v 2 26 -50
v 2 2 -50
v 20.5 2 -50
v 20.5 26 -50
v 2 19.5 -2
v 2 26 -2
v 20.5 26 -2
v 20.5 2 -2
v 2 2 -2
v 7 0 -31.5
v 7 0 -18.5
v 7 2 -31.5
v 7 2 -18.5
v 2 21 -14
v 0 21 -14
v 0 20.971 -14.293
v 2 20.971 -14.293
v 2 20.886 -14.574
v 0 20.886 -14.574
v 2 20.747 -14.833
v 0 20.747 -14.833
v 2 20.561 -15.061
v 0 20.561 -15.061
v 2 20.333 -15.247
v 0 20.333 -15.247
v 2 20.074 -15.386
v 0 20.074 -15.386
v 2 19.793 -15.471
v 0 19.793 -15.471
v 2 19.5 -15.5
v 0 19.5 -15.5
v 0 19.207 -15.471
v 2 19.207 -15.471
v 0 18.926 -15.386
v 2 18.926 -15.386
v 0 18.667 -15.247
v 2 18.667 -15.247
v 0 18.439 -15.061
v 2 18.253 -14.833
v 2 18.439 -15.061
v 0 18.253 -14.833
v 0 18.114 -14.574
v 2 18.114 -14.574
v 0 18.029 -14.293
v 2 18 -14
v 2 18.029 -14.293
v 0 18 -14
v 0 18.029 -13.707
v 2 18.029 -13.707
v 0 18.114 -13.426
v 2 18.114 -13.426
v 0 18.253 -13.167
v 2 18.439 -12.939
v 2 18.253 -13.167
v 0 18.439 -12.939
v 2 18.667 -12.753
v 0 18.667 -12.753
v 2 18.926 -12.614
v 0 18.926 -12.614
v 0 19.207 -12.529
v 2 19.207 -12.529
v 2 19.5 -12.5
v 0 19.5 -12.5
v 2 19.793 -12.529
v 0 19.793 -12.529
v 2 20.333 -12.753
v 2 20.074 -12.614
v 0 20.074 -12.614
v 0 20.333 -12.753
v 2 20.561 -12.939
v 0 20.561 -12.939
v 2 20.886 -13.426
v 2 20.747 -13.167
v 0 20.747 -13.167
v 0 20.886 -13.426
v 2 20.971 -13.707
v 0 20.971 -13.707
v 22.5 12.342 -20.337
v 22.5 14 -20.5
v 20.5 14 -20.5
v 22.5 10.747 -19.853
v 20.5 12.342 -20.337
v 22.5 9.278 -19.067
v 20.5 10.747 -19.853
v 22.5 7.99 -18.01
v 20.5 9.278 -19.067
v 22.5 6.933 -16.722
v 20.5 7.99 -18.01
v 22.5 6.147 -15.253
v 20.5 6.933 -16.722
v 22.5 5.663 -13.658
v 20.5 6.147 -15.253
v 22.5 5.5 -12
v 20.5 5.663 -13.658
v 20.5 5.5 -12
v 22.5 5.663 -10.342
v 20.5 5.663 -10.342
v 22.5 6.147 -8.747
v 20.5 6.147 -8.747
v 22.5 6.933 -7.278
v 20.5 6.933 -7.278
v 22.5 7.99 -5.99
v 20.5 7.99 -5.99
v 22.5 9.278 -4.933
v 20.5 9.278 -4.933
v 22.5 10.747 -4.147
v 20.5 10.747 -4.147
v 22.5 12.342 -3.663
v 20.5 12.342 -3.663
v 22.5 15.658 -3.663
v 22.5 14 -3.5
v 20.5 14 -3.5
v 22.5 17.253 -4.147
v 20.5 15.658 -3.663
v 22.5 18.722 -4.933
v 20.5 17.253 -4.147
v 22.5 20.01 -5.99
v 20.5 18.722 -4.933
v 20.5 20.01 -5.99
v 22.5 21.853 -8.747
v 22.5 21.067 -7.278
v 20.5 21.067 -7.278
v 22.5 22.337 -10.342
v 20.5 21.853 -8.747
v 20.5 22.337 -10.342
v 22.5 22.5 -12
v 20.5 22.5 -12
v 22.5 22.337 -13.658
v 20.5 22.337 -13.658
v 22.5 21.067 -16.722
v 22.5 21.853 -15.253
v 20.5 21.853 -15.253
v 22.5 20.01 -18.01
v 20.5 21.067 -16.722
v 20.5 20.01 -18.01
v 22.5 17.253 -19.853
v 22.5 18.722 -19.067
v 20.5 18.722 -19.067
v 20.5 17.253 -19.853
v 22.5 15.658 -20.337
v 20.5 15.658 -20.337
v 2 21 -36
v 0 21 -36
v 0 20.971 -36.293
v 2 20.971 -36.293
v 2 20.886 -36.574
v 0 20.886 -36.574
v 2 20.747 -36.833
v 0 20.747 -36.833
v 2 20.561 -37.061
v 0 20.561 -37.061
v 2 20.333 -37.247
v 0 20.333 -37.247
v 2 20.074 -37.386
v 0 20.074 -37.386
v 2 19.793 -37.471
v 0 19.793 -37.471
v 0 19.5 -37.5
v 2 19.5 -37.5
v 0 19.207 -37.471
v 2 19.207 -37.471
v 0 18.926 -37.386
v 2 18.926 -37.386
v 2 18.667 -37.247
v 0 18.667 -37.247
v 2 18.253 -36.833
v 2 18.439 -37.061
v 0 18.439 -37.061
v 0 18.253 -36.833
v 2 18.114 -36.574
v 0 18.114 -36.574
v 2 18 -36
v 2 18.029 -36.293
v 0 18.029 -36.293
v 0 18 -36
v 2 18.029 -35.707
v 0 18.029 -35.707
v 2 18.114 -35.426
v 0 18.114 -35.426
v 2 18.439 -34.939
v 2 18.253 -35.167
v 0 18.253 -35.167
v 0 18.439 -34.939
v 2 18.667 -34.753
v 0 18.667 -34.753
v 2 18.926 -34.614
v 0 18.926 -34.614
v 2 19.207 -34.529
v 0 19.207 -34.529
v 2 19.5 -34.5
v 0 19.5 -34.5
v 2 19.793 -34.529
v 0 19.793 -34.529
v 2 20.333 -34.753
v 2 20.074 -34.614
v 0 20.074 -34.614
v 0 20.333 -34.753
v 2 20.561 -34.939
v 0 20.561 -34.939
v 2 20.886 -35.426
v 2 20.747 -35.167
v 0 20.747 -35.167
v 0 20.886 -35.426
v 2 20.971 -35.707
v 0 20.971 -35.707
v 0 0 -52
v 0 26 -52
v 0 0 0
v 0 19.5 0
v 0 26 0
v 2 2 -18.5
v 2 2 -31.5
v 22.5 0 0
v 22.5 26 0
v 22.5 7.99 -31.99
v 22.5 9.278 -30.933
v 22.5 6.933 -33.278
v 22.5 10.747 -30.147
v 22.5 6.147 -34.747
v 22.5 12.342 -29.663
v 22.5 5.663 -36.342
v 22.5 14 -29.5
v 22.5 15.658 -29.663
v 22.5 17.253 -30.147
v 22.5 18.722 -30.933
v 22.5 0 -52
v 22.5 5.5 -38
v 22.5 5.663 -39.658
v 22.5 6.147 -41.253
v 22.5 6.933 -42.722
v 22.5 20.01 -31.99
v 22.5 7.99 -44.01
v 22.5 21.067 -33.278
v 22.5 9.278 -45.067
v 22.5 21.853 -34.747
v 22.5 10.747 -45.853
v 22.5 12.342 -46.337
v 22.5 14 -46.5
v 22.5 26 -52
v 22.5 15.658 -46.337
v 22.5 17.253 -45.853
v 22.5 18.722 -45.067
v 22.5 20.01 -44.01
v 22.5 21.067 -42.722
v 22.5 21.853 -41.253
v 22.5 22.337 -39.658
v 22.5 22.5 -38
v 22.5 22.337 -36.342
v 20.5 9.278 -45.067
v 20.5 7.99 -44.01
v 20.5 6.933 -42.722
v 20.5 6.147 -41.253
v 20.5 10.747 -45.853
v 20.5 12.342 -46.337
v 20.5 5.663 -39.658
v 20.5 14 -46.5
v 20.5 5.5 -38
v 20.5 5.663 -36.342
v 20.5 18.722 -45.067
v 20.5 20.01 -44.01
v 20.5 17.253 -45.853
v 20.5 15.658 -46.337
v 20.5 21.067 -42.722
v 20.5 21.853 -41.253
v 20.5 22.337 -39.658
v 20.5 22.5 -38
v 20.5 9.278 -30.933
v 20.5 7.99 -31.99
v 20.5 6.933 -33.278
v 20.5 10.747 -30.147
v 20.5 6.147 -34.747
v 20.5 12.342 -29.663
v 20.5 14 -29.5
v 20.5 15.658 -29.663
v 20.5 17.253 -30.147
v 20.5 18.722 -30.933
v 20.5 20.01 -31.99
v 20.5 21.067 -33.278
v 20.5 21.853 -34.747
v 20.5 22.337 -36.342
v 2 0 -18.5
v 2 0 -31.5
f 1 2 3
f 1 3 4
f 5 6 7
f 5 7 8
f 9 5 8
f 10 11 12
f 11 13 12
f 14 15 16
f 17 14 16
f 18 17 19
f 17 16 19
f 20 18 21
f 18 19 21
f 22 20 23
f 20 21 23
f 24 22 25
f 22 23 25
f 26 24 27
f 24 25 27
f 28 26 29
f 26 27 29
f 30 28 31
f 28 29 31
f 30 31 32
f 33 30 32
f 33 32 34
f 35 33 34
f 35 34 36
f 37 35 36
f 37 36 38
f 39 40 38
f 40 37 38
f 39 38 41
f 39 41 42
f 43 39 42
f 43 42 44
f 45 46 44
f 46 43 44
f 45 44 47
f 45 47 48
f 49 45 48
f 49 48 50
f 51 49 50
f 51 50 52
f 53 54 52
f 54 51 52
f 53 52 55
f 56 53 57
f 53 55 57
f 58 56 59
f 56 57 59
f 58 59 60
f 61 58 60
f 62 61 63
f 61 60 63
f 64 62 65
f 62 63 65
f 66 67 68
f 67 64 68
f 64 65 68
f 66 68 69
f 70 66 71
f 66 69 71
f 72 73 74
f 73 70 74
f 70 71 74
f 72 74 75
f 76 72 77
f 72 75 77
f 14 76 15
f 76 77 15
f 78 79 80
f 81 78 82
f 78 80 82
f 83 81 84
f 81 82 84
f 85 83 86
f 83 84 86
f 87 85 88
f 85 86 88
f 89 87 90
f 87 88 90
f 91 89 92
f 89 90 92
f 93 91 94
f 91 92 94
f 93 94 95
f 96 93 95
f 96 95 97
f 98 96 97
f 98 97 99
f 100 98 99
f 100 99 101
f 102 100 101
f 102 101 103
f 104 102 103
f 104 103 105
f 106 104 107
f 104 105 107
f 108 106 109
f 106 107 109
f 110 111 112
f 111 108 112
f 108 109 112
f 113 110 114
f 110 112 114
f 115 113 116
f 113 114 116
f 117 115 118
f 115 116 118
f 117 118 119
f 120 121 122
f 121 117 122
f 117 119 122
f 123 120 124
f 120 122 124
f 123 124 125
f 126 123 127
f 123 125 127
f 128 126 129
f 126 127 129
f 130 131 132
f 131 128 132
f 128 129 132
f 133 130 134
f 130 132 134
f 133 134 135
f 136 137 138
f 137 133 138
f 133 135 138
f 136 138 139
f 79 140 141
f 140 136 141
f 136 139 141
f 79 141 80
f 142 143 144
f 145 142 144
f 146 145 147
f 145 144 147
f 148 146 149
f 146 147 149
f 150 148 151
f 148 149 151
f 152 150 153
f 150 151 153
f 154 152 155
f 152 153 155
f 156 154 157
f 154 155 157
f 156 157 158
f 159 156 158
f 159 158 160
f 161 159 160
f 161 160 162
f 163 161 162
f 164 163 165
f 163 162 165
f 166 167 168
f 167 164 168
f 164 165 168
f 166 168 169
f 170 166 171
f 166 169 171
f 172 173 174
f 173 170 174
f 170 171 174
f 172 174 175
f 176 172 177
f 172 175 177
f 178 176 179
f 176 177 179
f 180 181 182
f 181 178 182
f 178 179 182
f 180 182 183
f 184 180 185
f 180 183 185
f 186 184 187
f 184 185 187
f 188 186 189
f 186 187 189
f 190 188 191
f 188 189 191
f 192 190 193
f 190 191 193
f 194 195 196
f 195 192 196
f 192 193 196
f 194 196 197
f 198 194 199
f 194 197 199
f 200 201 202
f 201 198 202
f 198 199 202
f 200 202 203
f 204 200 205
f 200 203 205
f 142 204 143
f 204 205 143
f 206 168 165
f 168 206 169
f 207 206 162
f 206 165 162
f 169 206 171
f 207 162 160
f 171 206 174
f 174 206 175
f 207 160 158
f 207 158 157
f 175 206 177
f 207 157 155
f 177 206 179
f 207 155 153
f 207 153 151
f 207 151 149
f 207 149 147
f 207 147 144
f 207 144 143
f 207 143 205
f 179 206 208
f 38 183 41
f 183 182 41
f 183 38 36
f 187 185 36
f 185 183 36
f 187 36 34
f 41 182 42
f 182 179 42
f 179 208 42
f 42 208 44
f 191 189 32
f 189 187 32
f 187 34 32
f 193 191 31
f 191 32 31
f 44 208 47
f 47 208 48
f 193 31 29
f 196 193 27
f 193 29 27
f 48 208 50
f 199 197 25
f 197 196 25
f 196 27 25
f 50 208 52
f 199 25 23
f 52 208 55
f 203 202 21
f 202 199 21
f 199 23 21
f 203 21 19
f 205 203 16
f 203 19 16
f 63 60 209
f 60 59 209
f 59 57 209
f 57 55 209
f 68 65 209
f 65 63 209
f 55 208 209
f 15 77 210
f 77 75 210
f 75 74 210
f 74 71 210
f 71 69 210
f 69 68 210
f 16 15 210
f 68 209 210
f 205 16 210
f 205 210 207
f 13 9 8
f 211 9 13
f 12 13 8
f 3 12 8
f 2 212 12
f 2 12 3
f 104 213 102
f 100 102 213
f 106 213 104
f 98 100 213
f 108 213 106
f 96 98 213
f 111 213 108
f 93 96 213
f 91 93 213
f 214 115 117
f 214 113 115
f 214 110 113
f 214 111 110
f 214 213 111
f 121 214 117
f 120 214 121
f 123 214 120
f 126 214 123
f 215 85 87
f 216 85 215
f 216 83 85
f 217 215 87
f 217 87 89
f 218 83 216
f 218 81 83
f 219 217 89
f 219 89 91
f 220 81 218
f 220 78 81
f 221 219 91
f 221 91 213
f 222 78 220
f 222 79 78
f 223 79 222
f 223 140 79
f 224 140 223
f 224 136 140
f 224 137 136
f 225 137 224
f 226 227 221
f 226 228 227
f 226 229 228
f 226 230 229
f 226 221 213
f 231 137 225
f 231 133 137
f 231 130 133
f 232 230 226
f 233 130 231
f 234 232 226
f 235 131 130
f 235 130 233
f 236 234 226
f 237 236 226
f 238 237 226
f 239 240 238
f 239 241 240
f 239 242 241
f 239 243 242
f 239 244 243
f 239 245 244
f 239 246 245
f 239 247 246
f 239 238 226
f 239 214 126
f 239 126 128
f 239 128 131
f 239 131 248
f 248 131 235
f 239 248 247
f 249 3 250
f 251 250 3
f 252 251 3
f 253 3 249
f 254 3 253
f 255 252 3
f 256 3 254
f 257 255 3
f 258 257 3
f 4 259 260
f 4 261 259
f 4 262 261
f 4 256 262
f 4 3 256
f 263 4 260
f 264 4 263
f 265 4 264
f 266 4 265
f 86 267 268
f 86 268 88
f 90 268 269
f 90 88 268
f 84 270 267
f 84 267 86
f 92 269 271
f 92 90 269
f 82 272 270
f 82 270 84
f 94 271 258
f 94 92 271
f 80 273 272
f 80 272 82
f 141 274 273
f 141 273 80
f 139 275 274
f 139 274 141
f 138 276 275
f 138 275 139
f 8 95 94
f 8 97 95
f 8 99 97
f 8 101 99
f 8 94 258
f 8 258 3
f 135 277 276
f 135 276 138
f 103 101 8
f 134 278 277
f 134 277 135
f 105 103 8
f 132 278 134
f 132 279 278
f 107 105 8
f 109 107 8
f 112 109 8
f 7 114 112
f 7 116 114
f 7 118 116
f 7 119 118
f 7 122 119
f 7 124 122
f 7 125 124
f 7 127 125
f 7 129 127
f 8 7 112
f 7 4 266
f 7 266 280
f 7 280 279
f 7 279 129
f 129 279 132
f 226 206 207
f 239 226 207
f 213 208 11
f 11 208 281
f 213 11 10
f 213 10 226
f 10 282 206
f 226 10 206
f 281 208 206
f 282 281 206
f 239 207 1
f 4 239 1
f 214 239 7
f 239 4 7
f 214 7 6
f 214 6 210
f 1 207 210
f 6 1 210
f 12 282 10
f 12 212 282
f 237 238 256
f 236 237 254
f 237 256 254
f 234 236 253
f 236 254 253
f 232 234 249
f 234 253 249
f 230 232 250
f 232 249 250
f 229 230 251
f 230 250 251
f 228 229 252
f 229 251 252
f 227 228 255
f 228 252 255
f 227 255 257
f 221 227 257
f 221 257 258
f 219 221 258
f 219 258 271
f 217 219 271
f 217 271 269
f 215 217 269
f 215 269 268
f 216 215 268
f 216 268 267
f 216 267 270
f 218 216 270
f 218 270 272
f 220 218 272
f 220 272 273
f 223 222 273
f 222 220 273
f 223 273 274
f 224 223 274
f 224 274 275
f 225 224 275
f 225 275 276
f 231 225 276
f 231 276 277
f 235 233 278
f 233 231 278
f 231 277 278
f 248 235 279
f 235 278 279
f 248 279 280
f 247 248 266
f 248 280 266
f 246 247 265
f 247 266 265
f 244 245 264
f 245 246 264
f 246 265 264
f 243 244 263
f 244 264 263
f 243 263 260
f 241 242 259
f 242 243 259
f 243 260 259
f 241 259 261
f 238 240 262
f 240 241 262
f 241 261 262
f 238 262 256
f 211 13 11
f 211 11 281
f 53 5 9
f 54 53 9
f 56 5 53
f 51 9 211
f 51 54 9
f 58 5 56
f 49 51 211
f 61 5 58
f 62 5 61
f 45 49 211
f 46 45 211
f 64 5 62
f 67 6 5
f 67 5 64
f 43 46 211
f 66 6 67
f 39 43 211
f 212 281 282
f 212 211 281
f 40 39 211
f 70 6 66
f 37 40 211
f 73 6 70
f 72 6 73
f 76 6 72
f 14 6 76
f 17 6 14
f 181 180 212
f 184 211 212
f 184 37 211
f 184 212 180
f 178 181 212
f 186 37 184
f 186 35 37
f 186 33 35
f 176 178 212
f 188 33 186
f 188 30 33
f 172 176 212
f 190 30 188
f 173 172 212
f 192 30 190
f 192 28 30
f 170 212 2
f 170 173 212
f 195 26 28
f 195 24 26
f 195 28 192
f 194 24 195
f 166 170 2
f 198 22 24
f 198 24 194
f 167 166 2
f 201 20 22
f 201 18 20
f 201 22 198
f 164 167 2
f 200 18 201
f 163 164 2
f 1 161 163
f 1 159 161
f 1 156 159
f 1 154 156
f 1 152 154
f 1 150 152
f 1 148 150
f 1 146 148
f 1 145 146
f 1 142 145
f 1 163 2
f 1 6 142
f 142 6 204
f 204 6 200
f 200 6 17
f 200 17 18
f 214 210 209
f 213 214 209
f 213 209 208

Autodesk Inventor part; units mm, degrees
ref_plane "YZ Plane" through (0, 0, 0) normal (1, 0, 0) x (0, 1, 0)
ref_plane "XZ Plane" through (0, 0, 0) normal (0, 1, 0) x (-1, 0, 0)
ref_plane "XY Plane" through (0, 0, 0) normal (0, 0, 1) x (1, 0, 0)
sketch "Sketch1" plane through (0, 0, 0) normal (1, 0, 0) x (0, 1, 0)
  line L0 (0, 0) -> (0, -52)
  line L1 (0, -52) -> (26, -52)
  line L2 (26, -52) -> (26, 0)
  line L3 (26, 0) -> (0, 0)
  line L4 (26, 0) -> (19.5, 0)
  line L5 (19.5, 0) -> (19.5, -14)
  line L6 (19.5, -14) -> (19.5, -36)
  circle A0 centre (19.5, -14) radius 1.5
  circle A1 centre (19.5, -36) radius 1.5
  dimension "d0" = 52
  dimension "d1" = 26
  dimension "d2" = 6.5
  dimension "d3" = 14
  dimension "d4" = 22
  dimension "d5" = 3
  dimension "d6" = 3
extrude "Extrusion1" add sketch "Sketch1" along normal blind 2
sketch "Sketch2" plane through (2, 0, 0) normal (1, 0, 0) x (0, 0, -1)
  line L0 (0, 0) -> (52, 0) projected
  line L1 (52, 0) -> (52, 26) projected
  line L2 (52, 26) -> (0, 26) projected
  line L3 (0, 26) -> (0, 0) projected
  circle A0 centre (36, 19.5) radius 1.5 projected
  circle A1 centre (14, 19.5) radius 1.5 projected
  line L4 (52, 26) -> (0, 26) projected
  line L5 (0, 26) -> (2, 26)
  line L6 (2, 26) -> (2, 2)
  line L7 (2, 2) -> (50, 2)
  line L8 (50, 2) -> (50, 24)
  line L9 (50, 24) -> (2, 24)
  line L10 (50, 24) -> (50, 26)
  dimension "d9" = 2
  dimension "d10" = 24
  dimension "d11" = 48
  dimension "d12" = 22
extrude "Extrusion2" add sketch "Sketch2" along normal blind 17 contours L3 L2 L6 L7 L8 L10 L1 L0
sketch "Sketch3" plane through (19, 0, 0) normal (1, 0, 0) x (0, 0, -1)
  line L0 (52, 26) -> (50, 26) projected
  line L1 (50, 26) -> (50, 2) projected
  line L2 (50, 2) -> (2, 2) projected
  line L3 (2, 2) -> (2, 26) projected
  line L4 (2, 26) -> (0, 26) projected
  line L5 (0, 26) -> (0, 0) projected
  line L6 (0, 0) -> (52, 0) projected
  line L7 (52, 0) -> (52, 26) projected
  line L8 (2, 26) -> (0, 26) projected
  line L9 (52, 26) -> (0, 26) projected
  line L10 (0, 26) -> (52, 26)
extrude "Extrusion3" add sketch "Sketch3" along normal blind 2
sketch "Sketch4" plane through (21, 0, 0) normal (1, 0, 0) x (0, 0, -1)
  circle A0 centre (14, 19.5) radius 1.5 projected
  line L0 (52, 26) -> (0, 26) projected
  line L1 (0, 26) -> (0, 0) projected
  line L2 (0, 0) -> (52, 0) projected
  line L3 (52, 0) -> (52, 26) projected
  circle A1 centre (36, 19.5) radius 1.5 projected
  line L4 (52, 26) -> (0, 26) projected
  line L5 (0, 26) -> (0, 0) projected
  line L6 (0, 0) -> (52, 0) projected
  line L7 (52, 0) -> (52, 26) projected
  line L8 (0, 26) -> (0, 0) projected
  line L9 (0, 26) -> (25, 26)
  line L10 (50, 26) -> (2, 26) projected
  line L11 (25, 26) -> (38, 26)
  line L12 (38, 26) -> (38, 0)
  line L13 (0, 0) -> (52, 0) projected
  line L14 (25, 26) -> (12, 26)
  line L15 (12, 26) -> (12, 0)
  line L16 (52, 26) -> (0, 26) projected
  line L17 (0, 26) -> (0, 4)
  line L18 (0, 4) -> (50, 4)
  line L19 (52, 0) -> (52, 26) projected
  line L20 (50, 4) -> (50, 26)
  line L21 (0, 26) -> (0, 24)
  line L22 (0, 24) -> (0, 14)
  line L23 (0, 14) -> (38, 14)
  circle A2 centre (12, 14) radius 8.5
  circle A3 centre (38, 14) radius 8.5
  dimension "d17" = 25
  dimension "d18" = 13
  dimension "d19" = 13
  dimension "d20" = 22
  dimension "d21" = 2
  dimension "d22" = 10
  dimension "d23" = 17
  dimension "d24" = 17
extrude "Extrusion4" cut sketch "Sketch4" against normal blind 2 contours A0 | A3 L12 | L12 L23 A3 | L12 A3 L23 | A2 L23 L15 | L15 L23 A2 | A2 L15 L23 | A2 L23 L15 | A1
sketch "Sketch5" plane through (2, 2, -2) normal (0, 1, 0) x (1, 0, 0)
  line L0 (0, 0) -> (0, 48) projected
  line L1 (0, 0) -> (17, 0) projected
  line L2 (17, 48) -> (17, 0) projected
  line L3 (0, 48) -> (17, 48) projected
  line L4 (0, 13.5) -> (0, 10.5) projected
  line L5 (0, 35.5) -> (0, 32.5) projected
  line L6 (0, 48) -> (0, 0) projected
  line L7 (0, 0) -> (0, 12)
  line L8 (0, 12) -> (0, 34)
  line L9 (0, 12) -> (0, 23)
  line L10 (0, 23) -> (0, 29.5)
  line L11 (0, 29.5) -> (4, 29.5)
  line L12 (4, 29.5) -> (4, 16.5)
  line L13 (4, 16.5) -> (0, 16.5)
  line L14 (0, 16.5) -> (0, 23)
  point P0 (-2, -2)
  point P1 (0, 16.5)
  dimension "d27" = 12
  dimension "d28" = 22
  dimension "d29" = 11
  dimension "d30" = 6.5
  dimension "d31" = 4
  dimension "d32" = 13
extrude "Extrusion5" cut sketch "Sketch5" against normal blind 2 contours L0 L11 L12 L13
sketch "Sketch6" plane through (21, 0, 0) normal (1, 0, 0) x (0, 0, -1)
  circle A0 centre (38, 14) radius 8.5 projected
  circle A1 centre (12, 14) radius 8.5 projected
  line L0 (52, 26) -> (0, 26) projected
  line L1 (0, 26) -> (0, 0) projected
  line L2 (0, 0) -> (52, 0) projected
  line L3 (52, 0) -> (52, 26) projected
extrude "Extrusion6" add sketch "Sketch6" along normal blind 1.5
sketch "Sketch7" plane through (19, 0, 0) normal (-1, 0, 0) x (0, 0, 1)
  line L0 (0, 26) -> (0, 0) projected
  line L1 (0, 0) -> (-52, 0) projected
  line L2 (-52, 0) -> (-52, 26) projected
  line L3 (-52, 26) -> (0, 26) projected
  circle A0 centre (-38, 14) radius 8.5 projected
  circle A1 centre (-12, 14) radius 8.5 projected
  line L4 (0, 26) -> (0, 0) projected
  line L5 (0, 26) -> (-2, 26)
  line L6 (-52, 26) -> (0, 26) projected
  line L7 (-2, 26) -> (-2, 2)
  line L8 (-2, 2) -> (-50, 2)
  line L9 (-50, 2) -> (-50, 26)
  dimension "d37" = 2
  dimension "d38" = 24
  dimension "d39" = 48
extrude "Extrusion7" cut sketch "Sketch7" against normal blind 1.5 contours L7 L8 L9 L3
sketch "Sketch8" plane through (2, 2, -31.5) normal (0, 1, 0) x (1, 0, 0)
  line L0 (0, 0) -> (4, 0) projected
  line L1 (4, 0) -> (4, -13) projected
  line L2 (4, -13) -> (0, -13) projected
  line L3 (0, -29.5) -> (0, -13) projected
  line L4 (0, -29.5) -> (18.5, -29.5) projected
  line L5 (18.5, -29.5) -> (18.5, 18.5) projected
  line L6 (0, 18.5) -> (18.5, 18.5) projected
  line L7 (0, 0) -> (0, 18.5) projected
  line L8 (4, -13) -> (0, -13) projected
  line L9 (4, -13) -> (5, -13)
  line L10 (5, -13) -> (5, 0)
  line L11 (4, 0) -> (4, -13) projected
  line L12 (5, 0) -> (4, 0)
  point P0 (-2, -31.5)
  dimension "d42" = 1
extrude "Extrusion8" cut sketch "Sketch8" against normal through all contours L12 L10 L9 L1
properties part number "soporte_sensor"
